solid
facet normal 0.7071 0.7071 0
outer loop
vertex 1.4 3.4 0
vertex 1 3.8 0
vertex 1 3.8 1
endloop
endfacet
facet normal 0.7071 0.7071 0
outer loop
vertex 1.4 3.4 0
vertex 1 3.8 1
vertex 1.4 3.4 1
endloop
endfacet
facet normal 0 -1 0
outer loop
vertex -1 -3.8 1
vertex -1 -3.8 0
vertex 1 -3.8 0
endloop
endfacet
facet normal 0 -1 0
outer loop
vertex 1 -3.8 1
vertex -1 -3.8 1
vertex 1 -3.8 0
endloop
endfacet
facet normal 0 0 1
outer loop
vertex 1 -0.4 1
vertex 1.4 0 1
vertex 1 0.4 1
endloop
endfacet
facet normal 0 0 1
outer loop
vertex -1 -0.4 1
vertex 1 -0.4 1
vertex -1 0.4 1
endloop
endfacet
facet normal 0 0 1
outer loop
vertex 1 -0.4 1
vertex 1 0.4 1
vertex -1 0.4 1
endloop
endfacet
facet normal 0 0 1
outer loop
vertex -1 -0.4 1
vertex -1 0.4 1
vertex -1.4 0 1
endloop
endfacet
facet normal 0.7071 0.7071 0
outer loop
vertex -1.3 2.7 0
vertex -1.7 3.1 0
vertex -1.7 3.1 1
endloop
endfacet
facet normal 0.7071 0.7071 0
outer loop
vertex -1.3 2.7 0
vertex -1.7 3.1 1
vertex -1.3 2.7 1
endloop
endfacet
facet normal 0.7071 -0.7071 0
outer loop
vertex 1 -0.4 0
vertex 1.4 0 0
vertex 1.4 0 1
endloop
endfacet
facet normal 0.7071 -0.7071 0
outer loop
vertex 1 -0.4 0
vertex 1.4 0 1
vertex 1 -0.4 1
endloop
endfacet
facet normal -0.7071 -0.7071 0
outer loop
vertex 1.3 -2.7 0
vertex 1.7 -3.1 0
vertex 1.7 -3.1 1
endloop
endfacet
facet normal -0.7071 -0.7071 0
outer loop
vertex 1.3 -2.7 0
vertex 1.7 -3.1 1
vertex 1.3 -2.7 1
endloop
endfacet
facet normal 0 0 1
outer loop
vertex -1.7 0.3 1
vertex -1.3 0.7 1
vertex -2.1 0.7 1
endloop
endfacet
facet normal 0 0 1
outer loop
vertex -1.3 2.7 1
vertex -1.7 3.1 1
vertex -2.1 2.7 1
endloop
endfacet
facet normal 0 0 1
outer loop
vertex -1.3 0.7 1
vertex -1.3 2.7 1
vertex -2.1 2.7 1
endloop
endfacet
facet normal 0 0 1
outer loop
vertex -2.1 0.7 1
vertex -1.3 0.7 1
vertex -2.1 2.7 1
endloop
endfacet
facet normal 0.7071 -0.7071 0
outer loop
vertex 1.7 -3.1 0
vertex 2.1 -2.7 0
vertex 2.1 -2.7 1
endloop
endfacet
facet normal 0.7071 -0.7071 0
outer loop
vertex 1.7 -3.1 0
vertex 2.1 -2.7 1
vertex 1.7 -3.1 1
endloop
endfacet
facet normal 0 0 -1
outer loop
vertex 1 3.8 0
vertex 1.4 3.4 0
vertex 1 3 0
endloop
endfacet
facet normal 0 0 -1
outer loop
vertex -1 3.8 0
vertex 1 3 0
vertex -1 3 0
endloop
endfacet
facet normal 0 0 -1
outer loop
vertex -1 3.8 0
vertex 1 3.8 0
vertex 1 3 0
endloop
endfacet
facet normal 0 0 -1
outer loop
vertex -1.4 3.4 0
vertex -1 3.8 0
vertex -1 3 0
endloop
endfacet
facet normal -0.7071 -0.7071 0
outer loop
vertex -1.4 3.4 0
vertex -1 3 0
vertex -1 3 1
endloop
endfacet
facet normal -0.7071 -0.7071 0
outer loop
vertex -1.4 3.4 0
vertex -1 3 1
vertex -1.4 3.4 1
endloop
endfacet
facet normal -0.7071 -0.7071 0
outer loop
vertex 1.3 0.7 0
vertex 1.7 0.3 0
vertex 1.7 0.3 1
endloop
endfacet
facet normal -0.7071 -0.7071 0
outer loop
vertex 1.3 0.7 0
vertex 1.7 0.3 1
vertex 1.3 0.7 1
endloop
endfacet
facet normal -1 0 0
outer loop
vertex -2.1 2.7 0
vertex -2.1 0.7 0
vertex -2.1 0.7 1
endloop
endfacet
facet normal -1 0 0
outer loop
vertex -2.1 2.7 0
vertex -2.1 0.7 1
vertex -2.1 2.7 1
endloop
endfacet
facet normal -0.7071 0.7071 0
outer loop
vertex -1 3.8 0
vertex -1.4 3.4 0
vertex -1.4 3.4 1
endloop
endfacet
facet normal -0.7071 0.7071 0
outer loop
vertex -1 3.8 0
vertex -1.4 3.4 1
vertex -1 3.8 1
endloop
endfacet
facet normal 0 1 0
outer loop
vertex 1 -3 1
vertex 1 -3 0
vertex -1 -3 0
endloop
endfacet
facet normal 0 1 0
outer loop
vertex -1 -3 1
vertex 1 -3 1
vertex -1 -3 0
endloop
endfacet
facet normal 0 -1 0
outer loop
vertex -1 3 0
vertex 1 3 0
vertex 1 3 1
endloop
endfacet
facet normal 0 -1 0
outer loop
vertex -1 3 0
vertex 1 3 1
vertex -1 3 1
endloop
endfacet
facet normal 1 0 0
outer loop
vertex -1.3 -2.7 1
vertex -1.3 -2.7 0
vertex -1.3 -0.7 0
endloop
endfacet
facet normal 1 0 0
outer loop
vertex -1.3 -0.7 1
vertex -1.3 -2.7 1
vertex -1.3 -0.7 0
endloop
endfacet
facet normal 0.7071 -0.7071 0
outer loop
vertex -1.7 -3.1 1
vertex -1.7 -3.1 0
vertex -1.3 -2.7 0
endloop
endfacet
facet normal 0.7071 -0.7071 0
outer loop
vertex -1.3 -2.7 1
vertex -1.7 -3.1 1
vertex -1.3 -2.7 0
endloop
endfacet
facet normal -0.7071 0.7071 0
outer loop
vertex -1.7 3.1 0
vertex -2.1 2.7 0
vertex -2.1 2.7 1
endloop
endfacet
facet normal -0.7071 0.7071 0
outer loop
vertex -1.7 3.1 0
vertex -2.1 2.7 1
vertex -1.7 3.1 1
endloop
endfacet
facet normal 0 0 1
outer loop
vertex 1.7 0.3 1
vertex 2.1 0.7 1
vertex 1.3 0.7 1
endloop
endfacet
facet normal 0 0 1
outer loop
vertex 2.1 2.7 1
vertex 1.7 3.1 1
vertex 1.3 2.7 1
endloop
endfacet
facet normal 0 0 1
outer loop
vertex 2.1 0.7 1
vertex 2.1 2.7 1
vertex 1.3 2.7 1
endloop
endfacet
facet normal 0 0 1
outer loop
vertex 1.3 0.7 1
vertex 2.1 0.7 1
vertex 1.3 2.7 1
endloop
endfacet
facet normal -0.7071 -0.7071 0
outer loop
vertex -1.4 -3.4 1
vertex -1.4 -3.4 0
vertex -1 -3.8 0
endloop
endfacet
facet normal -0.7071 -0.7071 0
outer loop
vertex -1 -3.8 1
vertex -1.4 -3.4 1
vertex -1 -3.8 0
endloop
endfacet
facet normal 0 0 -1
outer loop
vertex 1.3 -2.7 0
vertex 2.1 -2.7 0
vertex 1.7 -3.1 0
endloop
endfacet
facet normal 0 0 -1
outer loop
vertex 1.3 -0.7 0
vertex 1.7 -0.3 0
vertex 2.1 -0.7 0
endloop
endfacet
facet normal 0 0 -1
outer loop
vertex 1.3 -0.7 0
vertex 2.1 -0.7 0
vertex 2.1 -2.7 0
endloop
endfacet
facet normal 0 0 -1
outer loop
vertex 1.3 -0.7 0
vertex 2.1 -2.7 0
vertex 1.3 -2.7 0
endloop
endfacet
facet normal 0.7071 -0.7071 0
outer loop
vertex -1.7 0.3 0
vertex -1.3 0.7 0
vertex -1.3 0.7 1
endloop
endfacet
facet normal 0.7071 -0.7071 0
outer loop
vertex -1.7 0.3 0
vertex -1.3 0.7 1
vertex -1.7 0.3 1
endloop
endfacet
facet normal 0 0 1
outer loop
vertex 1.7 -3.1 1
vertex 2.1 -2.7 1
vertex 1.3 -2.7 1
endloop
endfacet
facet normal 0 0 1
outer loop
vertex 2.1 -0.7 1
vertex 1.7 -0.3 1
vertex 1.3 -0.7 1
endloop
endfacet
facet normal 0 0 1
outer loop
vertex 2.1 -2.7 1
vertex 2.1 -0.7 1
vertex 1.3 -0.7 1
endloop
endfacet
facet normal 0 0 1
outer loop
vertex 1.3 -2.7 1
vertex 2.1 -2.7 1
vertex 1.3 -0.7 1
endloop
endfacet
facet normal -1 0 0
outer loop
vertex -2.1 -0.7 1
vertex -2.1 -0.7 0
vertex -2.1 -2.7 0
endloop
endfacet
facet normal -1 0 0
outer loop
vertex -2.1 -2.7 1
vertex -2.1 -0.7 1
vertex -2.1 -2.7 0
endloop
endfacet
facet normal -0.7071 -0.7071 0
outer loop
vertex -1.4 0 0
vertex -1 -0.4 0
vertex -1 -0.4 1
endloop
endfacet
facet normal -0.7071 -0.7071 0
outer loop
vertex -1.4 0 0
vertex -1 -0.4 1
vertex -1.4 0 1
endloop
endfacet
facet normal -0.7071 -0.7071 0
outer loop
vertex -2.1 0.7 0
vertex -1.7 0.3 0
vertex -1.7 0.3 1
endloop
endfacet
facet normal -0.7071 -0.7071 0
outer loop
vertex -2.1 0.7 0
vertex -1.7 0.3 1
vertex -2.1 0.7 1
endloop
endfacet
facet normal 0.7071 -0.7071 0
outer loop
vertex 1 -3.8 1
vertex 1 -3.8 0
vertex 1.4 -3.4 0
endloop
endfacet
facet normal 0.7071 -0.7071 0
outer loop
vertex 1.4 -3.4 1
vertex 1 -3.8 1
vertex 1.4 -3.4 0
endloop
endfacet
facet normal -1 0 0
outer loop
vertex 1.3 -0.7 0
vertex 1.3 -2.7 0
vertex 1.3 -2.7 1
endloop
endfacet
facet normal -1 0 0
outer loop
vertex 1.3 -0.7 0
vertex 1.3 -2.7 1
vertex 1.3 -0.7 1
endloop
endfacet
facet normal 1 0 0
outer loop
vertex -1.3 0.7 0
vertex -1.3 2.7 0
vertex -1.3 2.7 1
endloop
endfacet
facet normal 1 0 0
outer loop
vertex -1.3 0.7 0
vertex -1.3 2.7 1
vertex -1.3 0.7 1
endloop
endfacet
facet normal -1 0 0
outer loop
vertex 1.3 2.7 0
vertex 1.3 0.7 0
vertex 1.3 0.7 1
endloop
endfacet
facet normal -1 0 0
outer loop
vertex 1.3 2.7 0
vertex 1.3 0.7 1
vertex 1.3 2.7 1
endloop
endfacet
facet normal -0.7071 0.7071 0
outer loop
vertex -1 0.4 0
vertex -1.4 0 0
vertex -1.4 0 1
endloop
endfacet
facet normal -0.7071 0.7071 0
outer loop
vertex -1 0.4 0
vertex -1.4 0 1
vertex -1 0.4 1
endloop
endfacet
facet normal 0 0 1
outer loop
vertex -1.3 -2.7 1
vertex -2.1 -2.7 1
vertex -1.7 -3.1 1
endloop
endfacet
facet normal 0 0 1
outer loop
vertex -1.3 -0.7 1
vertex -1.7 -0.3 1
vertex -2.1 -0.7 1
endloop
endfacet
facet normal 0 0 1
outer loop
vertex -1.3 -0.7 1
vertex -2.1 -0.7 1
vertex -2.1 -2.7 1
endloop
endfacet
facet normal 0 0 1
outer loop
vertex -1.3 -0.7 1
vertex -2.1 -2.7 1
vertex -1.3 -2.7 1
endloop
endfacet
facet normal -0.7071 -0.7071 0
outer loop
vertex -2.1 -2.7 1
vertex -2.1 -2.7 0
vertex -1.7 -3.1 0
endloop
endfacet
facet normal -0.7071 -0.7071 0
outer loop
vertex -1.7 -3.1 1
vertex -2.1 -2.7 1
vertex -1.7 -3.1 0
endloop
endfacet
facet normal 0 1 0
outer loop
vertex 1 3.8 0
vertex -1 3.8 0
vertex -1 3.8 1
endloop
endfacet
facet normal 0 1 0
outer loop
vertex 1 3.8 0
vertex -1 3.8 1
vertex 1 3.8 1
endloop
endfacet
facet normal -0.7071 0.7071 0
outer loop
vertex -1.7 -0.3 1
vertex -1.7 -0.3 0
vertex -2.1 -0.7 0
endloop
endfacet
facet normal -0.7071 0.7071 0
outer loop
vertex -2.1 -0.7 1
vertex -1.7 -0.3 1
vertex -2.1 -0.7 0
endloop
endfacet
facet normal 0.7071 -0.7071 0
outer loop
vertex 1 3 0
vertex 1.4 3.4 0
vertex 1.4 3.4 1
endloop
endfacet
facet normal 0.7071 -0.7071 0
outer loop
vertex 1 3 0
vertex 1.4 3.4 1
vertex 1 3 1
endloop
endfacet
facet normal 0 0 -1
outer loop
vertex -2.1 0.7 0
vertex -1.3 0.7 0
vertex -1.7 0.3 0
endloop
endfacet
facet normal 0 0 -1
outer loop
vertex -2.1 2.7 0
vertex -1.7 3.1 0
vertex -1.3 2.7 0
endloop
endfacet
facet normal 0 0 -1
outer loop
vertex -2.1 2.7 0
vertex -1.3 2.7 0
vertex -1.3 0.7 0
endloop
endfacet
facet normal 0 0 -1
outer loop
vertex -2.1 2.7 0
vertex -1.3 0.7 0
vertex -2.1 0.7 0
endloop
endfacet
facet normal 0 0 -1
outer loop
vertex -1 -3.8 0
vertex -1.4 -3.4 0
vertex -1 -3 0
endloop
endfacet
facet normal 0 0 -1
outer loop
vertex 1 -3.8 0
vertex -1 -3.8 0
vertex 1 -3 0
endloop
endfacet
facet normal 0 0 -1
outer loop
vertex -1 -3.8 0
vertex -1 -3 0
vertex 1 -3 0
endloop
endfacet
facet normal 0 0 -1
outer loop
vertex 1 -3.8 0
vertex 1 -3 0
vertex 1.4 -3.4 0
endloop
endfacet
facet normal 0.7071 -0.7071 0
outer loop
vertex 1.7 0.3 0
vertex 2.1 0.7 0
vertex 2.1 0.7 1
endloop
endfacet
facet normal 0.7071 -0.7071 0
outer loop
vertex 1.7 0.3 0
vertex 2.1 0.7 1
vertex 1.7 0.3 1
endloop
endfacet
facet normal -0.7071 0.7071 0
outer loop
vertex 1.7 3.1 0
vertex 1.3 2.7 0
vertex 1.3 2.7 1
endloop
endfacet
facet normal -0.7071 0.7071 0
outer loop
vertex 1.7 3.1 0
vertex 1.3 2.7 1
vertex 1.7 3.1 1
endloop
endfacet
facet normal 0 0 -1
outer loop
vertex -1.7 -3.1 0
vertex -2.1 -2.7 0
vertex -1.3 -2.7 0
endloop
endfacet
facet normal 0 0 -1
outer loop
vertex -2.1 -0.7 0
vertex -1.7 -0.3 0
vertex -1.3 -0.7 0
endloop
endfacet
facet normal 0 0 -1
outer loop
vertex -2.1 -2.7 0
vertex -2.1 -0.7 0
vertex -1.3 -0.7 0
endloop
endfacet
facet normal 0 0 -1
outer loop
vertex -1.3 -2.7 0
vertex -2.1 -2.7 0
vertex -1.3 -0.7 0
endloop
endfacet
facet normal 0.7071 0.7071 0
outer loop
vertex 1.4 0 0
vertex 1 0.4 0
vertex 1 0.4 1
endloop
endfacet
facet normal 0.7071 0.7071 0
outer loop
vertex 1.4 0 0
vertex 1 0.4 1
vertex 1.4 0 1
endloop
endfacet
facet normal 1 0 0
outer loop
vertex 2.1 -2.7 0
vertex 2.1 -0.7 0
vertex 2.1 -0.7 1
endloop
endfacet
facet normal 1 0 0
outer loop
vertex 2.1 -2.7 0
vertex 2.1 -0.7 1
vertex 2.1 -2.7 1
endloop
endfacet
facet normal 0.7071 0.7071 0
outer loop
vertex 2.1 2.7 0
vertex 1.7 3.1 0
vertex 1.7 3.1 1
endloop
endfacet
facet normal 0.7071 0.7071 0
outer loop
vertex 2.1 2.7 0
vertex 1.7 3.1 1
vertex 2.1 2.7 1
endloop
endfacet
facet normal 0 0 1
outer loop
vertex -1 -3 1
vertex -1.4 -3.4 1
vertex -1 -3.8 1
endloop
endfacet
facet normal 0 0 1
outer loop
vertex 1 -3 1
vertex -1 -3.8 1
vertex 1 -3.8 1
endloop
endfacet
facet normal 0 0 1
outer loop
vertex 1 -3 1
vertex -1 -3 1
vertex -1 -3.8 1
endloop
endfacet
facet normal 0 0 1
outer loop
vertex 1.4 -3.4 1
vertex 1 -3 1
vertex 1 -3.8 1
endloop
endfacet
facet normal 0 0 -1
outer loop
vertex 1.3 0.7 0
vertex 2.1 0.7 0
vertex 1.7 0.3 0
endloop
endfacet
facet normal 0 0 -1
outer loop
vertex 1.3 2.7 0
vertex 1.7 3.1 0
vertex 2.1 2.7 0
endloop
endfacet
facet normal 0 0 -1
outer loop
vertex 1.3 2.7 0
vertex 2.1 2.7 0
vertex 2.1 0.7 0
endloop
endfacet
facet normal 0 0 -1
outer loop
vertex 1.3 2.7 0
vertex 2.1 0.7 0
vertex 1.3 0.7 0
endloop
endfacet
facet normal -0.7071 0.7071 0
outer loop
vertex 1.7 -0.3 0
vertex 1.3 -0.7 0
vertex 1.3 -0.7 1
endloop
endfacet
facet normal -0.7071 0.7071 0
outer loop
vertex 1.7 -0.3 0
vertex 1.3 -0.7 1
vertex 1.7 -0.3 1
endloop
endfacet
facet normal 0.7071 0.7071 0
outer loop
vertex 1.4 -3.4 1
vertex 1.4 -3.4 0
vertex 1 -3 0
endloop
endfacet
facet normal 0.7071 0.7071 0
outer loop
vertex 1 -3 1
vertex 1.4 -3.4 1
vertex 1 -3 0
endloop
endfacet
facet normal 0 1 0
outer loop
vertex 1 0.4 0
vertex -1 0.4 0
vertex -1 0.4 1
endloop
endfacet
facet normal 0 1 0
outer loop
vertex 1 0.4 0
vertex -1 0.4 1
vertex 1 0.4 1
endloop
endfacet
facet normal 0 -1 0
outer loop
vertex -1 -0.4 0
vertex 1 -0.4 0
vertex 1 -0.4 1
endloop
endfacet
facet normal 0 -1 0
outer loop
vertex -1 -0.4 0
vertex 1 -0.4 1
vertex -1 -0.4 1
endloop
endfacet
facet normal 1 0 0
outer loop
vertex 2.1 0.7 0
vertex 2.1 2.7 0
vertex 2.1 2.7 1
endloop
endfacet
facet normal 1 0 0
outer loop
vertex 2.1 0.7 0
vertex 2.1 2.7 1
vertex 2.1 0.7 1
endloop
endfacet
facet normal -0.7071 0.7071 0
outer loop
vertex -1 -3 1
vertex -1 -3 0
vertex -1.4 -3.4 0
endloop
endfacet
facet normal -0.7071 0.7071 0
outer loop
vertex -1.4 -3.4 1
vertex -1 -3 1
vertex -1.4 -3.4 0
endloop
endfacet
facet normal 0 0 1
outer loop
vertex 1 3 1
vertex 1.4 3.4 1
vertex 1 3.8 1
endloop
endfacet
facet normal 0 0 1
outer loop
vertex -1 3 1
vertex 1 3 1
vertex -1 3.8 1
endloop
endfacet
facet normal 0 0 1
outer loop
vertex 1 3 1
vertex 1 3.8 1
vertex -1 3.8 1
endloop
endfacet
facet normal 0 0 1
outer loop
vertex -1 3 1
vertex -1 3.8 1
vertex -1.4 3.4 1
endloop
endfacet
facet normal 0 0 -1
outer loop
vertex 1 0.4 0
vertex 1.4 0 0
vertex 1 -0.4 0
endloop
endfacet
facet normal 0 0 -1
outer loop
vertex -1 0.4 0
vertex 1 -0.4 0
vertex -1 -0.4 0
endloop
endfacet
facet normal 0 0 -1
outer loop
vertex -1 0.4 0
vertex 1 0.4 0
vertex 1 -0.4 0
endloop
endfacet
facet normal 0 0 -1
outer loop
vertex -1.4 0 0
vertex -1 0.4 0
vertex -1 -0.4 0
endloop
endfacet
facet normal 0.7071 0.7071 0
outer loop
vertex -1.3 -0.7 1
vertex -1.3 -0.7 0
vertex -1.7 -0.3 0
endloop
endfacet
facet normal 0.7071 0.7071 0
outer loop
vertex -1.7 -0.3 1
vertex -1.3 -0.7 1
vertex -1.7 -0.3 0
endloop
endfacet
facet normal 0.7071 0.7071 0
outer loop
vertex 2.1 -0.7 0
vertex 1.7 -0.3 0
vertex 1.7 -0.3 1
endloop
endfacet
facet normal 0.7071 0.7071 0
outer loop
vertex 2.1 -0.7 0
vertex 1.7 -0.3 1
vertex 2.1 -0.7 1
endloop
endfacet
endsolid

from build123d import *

# Parameters (mm, degrees)
BOSS_EXTRUDE1_DEPTH   = 1
BOSS_EXTRUDE1_2_DEPTH = 1
BOSS_EXTRUDE1_3_DEPTH = 1
BOSS_EXTRUDE1_4_DEPTH = 1
BOSS_EXTRUDE1_5_DEPTH = 1
BOSS_EXTRUDE1_6_DEPTH = 1
BOSS_EXTRUDE1_7_DEPTH = 1


with BuildPart() as part:
    # Sketch1 → Boss-Extrude1 (new body)
    with BuildSketch(Plane.XY):
        Polygon((-2.1, 2.7), (-1.7, 3.1), (-1.3, 2.7), (-1.3, 0.7), (-1.7, 0.3), (-2.1, 0.7), align=None)
    extrude(amount=BOSS_EXTRUDE1_DEPTH)


with BuildPart() as body_2:
    # Sketch1 → Boss-Extrude1 2 (new body)
    with BuildSketch(Plane.XY):
        Polygon((-1, 0.4), (1, 0.4), (1.4, 0), (1, -0.4), (-1, -0.4), (-1.4, 0), align=None)
    extrude(amount=BOSS_EXTRUDE1_2_DEPTH)


with BuildPart() as body_3:
    # Sketch1 → Boss-Extrude1 3 (new body)
    with BuildSketch(Plane.XY):
        Polygon((1.7, -0.3), (2.1, -0.7), (2.1, -2.7), (1.7, -3.1), (1.3, -2.7), (1.3, -0.7), align=None)
    extrude(amount=BOSS_EXTRUDE1_3_DEPTH)


with BuildPart() as body_4:
    # Sketch1 → Boss-Extrude1 4 (new body)
    with BuildSketch(Plane.XY):
        Polygon((-2.1, -2.7), (-1.7, -3.1), (-1.3, -2.7), (-1.3, -0.7), (-1.7, -0.3), (-2.1, -0.7), align=None)
    extrude(amount=BOSS_EXTRUDE1_4_DEPTH)


with BuildPart() as body_5:
    # Sketch1 → Boss-Extrude1 5 (new body)
    with BuildSketch(Plane.XY):
        Polygon((1, -3), (-1, -3), (-1.4, -3.4), (-1, -3.8), (1, -3.8), (1.4, -3.4), align=None)
    extrude(amount=BOSS_EXTRUDE1_5_DEPTH)


with BuildPart() as body_6:
    # Sketch1 → Boss-Extrude1 6 (new body)
    with BuildSketch(Plane.XY):
        Polygon((1.3, 0.7), (1.3, 2.7), (1.7, 3.1), (2.1, 2.7), (2.1, 0.7), (1.7, 0.3), align=None)
    extrude(amount=BOSS_EXTRUDE1_6_DEPTH)


with BuildPart() as body_7:
    # Sketch1 → Boss-Extrude1 7 (new body)
    with BuildSketch(Plane.XY):
        Polygon((1, 3), (-1, 3), (-1.4, 3.4), (-1, 3.8), (1, 3.8), (1.4, 3.4), align=None)
    extrude(amount=BOSS_EXTRUDE1_7_DEPTH)


solid = Compound([part.part, body_2.part, body_3.part, body_4.part, body_5.part, body_6.part, body_7.part])
